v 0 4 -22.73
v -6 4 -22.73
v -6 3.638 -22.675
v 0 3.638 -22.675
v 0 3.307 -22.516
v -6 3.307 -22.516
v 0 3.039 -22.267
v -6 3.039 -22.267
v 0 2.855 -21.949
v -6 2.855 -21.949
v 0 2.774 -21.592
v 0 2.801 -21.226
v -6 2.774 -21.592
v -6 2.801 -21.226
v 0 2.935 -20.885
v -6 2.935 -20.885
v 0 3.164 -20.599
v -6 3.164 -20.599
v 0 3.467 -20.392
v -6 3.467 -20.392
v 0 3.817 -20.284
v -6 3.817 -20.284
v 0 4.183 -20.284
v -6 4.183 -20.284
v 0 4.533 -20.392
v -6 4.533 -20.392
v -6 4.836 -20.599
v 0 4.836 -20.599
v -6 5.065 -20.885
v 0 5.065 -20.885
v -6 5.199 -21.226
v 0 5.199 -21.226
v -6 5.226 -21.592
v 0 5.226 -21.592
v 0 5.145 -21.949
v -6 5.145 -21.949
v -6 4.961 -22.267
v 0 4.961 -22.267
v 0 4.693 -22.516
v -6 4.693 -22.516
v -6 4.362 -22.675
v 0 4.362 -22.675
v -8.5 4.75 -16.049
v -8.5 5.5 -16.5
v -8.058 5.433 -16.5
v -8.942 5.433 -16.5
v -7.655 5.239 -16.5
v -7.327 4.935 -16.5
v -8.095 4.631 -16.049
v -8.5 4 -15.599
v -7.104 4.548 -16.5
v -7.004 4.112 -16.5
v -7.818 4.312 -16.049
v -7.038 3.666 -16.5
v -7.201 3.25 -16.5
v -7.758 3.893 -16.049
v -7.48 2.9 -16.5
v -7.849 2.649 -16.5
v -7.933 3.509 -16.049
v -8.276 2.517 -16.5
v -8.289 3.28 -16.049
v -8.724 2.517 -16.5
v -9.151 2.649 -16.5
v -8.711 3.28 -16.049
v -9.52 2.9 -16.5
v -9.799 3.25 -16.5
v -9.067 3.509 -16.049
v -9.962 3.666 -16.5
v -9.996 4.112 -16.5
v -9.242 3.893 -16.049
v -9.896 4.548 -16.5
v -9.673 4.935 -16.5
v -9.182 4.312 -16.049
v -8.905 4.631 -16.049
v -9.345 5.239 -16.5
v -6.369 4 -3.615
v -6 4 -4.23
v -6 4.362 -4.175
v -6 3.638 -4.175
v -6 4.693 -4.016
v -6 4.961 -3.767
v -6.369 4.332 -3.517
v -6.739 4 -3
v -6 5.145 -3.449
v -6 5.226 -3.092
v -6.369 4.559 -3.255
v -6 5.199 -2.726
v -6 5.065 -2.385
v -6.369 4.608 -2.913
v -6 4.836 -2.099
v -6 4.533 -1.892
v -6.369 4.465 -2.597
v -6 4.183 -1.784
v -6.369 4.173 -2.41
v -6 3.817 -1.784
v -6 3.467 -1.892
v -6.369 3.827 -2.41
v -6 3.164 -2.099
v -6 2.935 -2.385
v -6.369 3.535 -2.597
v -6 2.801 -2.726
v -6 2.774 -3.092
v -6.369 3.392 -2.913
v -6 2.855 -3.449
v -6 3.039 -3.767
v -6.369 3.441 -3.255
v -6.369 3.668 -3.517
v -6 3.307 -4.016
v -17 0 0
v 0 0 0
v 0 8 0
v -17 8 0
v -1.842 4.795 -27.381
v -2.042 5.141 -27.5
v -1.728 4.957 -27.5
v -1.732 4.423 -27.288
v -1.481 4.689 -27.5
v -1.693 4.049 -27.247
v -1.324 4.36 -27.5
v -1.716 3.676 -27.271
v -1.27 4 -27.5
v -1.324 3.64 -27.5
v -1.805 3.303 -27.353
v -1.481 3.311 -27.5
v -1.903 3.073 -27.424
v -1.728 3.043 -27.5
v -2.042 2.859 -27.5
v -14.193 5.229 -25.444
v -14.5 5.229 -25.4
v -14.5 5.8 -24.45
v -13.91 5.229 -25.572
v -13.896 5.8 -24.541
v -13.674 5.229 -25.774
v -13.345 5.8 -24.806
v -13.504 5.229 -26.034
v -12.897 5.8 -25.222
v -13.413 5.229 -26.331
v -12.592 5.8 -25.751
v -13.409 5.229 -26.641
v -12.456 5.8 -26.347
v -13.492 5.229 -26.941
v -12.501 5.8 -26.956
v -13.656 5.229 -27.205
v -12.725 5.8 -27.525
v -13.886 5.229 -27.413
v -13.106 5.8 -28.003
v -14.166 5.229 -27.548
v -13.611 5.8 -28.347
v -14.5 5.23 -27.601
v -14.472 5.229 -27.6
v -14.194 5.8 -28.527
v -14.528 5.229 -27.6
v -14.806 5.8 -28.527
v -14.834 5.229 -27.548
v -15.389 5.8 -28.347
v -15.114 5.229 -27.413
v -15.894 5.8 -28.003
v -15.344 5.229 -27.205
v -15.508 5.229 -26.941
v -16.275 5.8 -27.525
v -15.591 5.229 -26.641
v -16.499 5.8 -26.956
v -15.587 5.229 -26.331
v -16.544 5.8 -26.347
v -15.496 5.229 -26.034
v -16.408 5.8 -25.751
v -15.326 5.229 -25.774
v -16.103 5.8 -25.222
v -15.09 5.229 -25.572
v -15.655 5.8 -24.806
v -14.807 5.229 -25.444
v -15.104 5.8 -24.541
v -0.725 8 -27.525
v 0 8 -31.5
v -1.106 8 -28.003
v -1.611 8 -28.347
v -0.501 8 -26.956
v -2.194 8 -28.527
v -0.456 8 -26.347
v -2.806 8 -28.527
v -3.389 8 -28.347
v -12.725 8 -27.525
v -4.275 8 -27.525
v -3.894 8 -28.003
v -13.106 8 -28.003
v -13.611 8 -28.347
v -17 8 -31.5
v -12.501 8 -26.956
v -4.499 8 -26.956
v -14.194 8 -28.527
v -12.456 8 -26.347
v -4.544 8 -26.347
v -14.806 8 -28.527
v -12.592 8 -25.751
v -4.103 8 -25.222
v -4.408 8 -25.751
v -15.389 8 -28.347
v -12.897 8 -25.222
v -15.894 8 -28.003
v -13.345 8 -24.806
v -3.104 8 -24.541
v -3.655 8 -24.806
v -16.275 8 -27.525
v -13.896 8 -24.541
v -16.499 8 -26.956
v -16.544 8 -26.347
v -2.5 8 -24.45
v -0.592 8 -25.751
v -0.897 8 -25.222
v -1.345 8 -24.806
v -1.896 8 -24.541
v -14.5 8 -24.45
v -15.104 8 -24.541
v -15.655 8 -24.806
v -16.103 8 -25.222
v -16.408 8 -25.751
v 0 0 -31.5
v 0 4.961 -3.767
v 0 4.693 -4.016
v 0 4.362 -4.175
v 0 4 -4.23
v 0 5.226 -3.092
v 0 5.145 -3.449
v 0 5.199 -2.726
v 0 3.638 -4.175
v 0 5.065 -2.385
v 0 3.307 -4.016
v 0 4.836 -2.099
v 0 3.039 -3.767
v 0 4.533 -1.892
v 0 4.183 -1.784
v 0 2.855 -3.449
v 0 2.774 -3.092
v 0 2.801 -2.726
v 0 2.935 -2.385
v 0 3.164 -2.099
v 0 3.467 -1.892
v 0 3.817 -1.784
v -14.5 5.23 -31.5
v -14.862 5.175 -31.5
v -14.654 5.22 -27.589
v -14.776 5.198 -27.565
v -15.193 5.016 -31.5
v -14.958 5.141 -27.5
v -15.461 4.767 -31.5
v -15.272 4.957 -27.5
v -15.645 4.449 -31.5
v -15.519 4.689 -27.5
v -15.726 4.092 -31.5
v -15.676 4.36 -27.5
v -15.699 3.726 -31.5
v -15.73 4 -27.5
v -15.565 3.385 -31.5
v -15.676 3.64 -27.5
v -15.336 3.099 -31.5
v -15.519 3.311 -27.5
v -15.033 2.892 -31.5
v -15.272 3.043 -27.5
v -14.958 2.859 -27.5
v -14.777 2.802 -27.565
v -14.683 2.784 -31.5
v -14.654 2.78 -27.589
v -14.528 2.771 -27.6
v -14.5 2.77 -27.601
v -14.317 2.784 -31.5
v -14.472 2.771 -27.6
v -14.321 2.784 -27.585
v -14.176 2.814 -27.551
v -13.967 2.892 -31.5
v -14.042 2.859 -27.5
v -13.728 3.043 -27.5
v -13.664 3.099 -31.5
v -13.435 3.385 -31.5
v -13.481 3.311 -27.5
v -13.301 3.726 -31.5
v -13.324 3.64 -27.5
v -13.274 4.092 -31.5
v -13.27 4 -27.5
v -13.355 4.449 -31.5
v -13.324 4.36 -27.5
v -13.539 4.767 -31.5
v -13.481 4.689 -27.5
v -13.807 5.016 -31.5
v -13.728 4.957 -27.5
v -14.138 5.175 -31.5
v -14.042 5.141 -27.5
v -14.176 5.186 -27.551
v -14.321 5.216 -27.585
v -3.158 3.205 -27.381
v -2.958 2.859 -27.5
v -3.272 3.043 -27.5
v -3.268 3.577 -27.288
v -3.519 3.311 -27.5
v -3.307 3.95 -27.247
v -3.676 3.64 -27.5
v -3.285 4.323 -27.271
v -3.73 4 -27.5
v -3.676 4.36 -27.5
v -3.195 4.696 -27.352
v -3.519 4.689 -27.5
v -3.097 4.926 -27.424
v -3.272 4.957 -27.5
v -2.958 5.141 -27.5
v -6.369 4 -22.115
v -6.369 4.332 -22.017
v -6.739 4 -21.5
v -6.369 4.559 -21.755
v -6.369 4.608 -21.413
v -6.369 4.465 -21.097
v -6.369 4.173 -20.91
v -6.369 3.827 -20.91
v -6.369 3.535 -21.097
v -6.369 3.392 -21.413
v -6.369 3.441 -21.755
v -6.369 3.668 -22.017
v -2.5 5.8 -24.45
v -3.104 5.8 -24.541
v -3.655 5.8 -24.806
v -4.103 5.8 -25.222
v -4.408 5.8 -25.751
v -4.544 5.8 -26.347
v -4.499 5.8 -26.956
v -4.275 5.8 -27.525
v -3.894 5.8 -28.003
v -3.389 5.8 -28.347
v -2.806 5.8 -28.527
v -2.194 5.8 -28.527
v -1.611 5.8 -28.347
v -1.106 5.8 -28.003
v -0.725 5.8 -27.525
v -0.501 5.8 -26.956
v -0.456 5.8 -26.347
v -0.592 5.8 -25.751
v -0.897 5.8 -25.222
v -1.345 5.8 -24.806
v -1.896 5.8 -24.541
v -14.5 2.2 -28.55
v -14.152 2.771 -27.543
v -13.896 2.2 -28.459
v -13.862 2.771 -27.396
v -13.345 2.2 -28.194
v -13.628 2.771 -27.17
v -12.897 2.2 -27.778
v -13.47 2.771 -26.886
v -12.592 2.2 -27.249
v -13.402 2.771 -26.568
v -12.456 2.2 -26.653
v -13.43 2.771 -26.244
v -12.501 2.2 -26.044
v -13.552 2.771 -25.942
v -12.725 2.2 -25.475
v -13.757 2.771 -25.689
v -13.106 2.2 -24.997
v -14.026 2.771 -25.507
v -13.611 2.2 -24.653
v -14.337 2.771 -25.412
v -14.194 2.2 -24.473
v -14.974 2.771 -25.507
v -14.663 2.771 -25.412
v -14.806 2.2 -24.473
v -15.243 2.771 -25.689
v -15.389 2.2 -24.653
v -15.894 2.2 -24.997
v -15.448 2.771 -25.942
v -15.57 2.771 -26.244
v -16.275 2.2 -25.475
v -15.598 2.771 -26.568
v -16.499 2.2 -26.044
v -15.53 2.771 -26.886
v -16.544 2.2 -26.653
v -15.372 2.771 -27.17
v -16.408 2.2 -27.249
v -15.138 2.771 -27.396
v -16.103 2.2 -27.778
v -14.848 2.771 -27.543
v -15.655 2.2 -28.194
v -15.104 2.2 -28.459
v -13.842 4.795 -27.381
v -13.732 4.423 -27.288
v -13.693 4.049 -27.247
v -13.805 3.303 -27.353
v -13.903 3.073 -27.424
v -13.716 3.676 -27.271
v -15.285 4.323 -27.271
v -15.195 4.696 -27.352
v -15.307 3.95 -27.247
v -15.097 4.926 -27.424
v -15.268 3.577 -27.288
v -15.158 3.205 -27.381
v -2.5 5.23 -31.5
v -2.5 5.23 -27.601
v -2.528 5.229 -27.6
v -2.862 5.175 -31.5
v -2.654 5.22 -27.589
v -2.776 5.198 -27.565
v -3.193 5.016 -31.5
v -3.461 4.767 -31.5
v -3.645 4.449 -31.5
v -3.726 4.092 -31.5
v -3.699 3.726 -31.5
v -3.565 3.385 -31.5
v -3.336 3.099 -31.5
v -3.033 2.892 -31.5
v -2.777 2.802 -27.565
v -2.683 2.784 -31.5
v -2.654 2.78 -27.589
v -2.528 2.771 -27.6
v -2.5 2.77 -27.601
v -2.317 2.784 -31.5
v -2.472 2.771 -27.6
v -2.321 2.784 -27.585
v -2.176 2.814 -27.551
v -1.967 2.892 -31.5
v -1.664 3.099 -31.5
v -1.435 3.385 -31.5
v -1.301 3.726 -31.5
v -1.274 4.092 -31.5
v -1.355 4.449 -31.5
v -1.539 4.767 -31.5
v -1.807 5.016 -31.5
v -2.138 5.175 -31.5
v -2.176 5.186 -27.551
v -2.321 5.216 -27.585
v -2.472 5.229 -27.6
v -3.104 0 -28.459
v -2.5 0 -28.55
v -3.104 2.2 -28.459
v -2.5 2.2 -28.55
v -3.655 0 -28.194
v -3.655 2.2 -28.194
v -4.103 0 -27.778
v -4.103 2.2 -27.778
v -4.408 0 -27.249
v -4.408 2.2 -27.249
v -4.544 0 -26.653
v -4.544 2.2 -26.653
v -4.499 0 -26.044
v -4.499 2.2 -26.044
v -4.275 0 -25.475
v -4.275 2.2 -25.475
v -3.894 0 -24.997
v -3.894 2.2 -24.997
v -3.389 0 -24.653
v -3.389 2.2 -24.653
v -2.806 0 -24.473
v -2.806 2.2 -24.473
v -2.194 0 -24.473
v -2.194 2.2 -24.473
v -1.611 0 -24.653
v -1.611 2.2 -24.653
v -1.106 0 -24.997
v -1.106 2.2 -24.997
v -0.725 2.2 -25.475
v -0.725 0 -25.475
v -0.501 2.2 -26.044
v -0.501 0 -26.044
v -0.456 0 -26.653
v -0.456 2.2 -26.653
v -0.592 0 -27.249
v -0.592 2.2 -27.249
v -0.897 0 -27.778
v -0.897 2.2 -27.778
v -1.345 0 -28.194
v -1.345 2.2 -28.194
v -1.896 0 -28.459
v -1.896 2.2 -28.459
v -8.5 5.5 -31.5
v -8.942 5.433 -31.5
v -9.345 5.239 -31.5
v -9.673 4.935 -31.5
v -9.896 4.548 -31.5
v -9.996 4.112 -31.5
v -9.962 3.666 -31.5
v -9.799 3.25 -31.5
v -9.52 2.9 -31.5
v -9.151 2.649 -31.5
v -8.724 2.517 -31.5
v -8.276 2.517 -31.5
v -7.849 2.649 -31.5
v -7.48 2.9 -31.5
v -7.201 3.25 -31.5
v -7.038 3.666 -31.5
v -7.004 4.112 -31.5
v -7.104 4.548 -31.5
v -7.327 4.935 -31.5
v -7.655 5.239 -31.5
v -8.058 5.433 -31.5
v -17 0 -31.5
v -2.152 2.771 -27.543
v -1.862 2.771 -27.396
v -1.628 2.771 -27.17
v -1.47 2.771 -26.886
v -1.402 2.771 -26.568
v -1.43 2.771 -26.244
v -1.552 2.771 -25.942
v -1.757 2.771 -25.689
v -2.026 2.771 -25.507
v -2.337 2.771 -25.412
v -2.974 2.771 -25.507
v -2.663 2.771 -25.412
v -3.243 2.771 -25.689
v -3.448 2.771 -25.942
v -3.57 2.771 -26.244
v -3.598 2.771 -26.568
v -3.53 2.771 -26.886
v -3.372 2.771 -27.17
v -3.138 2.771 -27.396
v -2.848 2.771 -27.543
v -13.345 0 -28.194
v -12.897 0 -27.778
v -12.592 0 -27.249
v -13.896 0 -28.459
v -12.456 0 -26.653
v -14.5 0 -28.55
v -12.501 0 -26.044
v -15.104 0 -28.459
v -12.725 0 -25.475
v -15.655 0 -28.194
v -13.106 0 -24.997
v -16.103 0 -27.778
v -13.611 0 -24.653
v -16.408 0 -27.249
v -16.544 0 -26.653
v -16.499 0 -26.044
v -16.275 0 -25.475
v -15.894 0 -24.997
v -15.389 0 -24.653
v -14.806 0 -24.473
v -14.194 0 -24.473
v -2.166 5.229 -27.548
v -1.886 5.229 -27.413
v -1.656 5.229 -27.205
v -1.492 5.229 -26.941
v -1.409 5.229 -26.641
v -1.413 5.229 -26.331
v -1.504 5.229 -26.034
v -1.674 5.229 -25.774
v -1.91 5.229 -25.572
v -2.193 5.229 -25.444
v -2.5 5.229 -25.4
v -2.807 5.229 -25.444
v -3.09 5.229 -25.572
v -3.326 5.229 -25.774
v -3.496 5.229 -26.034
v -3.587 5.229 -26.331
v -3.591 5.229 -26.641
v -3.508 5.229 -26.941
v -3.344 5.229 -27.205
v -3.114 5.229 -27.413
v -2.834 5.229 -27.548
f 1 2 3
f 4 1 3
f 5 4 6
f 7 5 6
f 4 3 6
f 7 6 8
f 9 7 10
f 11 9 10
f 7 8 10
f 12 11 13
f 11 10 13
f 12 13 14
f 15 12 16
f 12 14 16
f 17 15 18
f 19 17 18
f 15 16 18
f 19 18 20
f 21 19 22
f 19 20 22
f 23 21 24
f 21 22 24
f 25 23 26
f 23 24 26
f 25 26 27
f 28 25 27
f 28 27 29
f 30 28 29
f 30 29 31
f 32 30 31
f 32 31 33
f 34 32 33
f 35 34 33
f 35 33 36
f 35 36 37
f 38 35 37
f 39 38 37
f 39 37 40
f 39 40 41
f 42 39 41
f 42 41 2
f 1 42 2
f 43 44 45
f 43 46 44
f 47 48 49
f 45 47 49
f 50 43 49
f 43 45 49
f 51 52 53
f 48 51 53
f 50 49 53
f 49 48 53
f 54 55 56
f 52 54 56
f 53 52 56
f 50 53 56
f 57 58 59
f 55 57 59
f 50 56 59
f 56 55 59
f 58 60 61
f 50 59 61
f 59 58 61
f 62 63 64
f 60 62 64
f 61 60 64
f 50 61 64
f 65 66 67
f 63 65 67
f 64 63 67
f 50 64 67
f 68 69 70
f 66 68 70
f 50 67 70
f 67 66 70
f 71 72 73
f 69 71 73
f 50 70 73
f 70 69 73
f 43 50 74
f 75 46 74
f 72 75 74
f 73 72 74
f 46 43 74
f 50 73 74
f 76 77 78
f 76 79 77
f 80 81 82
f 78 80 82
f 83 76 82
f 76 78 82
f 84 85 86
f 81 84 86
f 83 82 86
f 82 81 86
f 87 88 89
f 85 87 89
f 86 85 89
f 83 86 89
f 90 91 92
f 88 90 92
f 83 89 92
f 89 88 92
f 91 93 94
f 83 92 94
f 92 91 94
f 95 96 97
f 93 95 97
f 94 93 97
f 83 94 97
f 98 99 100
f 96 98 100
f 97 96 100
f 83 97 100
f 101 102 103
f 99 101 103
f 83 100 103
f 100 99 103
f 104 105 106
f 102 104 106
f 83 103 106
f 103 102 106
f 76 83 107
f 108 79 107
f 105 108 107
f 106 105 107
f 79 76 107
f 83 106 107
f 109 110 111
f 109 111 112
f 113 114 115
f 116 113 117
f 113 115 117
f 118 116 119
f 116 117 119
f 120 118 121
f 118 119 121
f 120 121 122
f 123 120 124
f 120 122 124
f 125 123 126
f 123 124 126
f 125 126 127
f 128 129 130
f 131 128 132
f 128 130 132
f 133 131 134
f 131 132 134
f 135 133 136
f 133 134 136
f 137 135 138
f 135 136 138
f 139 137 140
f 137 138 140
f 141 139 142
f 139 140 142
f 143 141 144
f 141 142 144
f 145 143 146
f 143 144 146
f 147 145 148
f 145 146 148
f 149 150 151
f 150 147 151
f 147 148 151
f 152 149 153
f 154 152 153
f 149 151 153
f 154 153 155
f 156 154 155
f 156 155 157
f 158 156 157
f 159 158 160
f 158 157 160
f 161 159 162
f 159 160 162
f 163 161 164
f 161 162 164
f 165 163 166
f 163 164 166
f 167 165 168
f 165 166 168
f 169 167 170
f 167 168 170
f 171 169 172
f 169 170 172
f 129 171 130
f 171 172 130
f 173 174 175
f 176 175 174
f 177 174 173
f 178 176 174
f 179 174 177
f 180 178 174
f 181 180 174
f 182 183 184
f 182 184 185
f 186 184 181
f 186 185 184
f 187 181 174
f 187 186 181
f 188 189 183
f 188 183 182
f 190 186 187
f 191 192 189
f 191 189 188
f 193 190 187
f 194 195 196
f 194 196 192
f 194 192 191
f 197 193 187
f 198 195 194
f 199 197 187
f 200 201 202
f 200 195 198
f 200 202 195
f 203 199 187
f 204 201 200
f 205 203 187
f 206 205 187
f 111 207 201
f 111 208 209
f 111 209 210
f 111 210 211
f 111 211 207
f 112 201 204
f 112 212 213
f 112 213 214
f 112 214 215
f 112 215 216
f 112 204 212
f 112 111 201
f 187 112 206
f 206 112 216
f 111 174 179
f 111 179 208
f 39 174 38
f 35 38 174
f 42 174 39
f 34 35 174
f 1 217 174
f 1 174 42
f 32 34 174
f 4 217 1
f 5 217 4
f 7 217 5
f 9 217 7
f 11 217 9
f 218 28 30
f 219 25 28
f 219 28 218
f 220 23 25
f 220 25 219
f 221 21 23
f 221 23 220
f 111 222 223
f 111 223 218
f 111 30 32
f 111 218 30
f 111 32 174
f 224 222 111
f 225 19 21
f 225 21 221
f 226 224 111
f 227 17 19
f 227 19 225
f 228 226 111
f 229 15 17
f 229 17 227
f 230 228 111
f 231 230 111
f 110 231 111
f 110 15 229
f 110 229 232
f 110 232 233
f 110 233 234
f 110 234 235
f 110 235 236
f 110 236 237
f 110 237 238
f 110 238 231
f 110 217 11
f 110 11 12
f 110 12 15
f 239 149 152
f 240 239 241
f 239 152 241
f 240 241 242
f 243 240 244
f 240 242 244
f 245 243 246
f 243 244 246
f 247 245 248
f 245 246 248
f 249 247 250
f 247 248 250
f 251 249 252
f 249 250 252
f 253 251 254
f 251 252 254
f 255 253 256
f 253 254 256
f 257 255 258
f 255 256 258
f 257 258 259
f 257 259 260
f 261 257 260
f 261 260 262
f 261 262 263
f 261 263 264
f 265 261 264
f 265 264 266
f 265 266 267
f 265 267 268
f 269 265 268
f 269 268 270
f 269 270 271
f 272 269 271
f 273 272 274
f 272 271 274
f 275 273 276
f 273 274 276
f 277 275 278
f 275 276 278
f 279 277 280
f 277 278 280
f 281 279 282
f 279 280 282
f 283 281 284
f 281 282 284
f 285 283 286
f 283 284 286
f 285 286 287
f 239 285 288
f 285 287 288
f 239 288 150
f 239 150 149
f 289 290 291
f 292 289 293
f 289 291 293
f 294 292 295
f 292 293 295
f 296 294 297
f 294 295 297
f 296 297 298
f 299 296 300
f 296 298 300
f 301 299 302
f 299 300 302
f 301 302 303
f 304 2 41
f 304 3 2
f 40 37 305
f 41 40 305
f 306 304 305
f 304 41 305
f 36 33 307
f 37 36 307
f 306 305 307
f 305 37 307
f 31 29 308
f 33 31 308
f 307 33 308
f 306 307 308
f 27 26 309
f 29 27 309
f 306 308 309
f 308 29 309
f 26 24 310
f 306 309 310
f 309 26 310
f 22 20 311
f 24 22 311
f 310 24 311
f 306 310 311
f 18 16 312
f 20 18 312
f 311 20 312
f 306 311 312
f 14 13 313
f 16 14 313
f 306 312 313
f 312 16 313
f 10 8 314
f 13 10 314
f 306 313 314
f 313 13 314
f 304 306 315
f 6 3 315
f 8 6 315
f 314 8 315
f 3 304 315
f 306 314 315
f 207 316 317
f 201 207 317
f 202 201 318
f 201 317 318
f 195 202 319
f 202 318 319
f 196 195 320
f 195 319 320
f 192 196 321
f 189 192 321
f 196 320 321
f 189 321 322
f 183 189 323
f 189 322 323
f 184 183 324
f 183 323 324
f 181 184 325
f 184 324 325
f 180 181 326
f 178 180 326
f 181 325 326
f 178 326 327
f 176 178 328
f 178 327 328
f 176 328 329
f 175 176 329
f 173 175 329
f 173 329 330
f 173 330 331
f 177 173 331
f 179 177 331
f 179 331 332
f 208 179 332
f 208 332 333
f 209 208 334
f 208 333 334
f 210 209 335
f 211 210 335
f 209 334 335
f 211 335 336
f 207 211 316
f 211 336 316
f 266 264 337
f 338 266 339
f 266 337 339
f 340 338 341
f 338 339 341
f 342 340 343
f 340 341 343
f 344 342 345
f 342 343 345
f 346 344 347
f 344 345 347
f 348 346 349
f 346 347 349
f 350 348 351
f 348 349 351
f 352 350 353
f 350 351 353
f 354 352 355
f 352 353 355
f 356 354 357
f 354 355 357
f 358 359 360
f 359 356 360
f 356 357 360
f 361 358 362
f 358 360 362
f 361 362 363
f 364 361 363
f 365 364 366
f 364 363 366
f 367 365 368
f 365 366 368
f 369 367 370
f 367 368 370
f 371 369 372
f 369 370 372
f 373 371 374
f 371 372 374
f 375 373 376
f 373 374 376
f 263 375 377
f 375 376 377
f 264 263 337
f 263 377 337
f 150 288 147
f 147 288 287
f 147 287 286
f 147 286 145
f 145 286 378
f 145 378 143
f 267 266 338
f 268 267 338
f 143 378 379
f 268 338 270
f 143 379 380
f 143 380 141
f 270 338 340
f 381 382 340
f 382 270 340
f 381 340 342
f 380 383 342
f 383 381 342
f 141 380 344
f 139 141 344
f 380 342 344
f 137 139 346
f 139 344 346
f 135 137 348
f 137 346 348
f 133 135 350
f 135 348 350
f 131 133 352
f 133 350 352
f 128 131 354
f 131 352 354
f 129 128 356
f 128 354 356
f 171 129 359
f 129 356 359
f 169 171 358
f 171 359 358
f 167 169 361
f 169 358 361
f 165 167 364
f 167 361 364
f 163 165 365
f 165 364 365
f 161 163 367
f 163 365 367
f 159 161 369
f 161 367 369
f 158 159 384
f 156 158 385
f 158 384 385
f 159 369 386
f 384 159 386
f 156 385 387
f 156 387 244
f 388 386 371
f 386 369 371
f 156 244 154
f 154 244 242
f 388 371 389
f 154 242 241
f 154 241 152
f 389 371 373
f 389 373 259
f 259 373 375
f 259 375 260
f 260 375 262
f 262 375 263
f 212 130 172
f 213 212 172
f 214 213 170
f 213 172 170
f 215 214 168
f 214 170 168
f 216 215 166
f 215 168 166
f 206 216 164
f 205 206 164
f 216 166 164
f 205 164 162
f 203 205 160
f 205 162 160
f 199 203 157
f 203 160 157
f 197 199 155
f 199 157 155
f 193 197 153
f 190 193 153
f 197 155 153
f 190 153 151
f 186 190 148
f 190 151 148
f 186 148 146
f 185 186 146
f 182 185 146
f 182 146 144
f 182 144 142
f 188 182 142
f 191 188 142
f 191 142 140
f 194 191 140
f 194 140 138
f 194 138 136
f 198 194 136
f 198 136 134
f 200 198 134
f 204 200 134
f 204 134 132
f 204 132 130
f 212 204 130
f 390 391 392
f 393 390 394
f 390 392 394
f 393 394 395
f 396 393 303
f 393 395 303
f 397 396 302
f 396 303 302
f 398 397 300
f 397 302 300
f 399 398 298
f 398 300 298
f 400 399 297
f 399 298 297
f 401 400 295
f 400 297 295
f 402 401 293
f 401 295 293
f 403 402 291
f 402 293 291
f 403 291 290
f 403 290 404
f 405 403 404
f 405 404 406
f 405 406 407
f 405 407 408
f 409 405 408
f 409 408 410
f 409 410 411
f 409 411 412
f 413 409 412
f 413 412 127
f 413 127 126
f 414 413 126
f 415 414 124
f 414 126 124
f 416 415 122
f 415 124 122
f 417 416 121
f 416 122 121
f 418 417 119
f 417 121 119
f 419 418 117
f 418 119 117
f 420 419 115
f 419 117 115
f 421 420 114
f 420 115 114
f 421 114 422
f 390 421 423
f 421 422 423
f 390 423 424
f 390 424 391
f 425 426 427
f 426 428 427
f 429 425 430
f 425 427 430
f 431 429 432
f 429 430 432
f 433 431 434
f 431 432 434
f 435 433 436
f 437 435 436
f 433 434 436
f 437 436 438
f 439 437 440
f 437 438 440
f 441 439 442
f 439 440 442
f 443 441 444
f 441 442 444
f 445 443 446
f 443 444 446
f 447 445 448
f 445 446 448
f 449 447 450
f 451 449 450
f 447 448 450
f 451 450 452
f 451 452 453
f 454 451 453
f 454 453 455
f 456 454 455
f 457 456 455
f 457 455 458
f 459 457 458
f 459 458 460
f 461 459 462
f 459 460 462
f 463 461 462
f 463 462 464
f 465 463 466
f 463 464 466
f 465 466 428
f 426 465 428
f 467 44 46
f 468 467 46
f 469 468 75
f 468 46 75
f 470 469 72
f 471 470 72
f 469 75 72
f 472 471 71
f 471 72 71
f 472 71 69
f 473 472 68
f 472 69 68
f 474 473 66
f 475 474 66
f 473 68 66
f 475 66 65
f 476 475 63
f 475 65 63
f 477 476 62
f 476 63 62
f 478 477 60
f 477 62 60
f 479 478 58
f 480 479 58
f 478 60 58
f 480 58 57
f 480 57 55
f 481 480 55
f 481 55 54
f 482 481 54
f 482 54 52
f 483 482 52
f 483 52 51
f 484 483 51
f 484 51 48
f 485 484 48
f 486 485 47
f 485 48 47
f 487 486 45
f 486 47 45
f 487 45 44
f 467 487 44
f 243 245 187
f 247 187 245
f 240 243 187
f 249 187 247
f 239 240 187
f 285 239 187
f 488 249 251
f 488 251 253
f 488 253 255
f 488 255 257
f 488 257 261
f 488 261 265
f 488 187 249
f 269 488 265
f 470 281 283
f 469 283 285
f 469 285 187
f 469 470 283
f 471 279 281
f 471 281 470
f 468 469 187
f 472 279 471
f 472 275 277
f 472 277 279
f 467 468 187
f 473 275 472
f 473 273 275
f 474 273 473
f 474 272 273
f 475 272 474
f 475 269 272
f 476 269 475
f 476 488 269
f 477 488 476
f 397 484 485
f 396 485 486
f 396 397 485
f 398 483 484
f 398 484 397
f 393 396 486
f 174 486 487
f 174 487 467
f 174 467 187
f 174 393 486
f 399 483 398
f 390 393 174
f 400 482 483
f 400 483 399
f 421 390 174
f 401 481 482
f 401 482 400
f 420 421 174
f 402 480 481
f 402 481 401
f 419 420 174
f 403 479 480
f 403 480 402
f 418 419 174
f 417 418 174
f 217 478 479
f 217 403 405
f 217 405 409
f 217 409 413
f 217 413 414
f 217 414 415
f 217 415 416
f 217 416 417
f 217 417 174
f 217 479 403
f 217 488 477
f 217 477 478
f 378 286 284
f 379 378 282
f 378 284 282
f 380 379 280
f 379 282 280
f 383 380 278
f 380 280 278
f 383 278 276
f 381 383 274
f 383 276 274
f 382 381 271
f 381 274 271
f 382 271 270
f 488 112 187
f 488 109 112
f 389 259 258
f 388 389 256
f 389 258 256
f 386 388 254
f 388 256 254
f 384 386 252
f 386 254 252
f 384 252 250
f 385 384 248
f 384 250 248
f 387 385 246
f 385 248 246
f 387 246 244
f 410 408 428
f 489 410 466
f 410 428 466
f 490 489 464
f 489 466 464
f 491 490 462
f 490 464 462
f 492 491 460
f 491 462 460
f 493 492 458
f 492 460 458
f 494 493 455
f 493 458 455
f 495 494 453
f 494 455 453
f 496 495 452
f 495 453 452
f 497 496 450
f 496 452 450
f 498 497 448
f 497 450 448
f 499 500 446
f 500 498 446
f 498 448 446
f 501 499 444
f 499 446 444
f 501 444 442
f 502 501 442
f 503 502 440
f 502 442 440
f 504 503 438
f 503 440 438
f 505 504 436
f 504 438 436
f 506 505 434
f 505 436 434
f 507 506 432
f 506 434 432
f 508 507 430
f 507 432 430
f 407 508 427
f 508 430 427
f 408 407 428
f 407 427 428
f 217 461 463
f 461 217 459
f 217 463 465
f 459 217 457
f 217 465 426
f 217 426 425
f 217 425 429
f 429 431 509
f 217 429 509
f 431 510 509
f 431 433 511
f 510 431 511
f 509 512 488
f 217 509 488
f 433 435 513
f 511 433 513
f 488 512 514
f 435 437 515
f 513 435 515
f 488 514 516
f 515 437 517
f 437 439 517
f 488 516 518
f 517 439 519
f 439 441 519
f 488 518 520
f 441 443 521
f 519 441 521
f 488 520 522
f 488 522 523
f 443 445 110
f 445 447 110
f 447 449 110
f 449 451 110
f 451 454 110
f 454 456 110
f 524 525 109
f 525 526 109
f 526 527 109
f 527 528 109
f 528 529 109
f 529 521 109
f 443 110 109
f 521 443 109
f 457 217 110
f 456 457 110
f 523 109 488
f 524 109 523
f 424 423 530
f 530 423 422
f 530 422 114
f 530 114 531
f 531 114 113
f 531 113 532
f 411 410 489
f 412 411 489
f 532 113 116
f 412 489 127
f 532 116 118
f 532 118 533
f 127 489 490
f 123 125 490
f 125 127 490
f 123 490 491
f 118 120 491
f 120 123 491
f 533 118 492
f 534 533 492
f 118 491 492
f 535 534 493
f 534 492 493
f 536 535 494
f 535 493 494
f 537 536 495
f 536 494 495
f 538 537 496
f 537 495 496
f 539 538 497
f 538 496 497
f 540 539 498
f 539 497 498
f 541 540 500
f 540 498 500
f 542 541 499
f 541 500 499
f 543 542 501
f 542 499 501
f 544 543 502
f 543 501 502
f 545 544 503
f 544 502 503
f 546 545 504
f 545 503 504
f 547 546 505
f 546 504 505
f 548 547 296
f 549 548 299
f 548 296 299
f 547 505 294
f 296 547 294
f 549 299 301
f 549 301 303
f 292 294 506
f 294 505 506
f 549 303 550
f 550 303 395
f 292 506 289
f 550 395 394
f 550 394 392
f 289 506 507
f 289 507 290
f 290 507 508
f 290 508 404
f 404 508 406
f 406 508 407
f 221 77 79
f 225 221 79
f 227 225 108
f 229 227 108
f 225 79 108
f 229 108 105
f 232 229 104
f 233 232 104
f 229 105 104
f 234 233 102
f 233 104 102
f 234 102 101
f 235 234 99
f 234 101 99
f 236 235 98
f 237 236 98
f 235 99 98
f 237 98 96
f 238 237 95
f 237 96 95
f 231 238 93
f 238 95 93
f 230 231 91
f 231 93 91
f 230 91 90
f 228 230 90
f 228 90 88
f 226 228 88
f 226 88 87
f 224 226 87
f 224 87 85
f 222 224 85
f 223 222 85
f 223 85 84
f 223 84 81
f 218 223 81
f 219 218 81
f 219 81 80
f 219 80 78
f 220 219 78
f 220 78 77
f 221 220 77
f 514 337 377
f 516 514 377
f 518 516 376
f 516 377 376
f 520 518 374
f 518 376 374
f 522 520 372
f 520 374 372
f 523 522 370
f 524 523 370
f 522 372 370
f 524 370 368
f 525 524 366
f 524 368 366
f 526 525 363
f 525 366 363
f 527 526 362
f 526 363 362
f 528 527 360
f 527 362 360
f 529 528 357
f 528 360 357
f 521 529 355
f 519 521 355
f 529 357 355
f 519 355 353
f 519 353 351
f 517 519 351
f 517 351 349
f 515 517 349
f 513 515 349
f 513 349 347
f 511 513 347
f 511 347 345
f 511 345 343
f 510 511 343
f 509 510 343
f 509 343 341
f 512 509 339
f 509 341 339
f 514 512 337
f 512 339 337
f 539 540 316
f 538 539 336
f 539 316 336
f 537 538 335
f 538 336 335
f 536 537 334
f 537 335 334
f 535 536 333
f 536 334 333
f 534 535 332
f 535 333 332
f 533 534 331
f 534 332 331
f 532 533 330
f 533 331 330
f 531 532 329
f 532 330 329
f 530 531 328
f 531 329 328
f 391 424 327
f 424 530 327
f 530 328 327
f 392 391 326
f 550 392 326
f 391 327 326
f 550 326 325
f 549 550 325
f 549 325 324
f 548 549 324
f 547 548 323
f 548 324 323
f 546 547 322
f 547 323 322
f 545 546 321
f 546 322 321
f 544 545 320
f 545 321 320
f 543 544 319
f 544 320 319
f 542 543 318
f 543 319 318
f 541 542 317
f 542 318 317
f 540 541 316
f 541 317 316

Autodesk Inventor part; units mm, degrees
ref_plane "YZ Plane" through (0, 0, 0) normal (1, 0, 0) x (0, 1, 0)
ref_plane "XZ Plane" through (0, 0, 0) normal (0, 1, 0) x (-1, 0, 0)
ref_plane "XY Plane" through (0, 0, 0) normal (0, 0, 1) x (1, 0, 0)
sketch "スケッチ1" plane through (0, 0, 0) normal (0, 1, 0) x (-1, 0, 0)
  line L0 (0, 0) -> (17, 0)
  line L1 (17, 0) -> (17, -31.5)
  line L2 (17, -31.5) -> (0, -31.5)
  line L3 (0, -31.5) -> (0, 0)
  dimension "d0" = 17
  dimension "d1" = 31.5
extrude "押し出し1" add sketch "スケッチ1" along normal blind 8
sketch "スケッチ2" plane through (0, 0, 0) normal (1, 0, 0) x (0, 0, -1)
  line L0 (31.5, 0) -> (31.5, 8) projected
  line L1 (0, 0) -> (31.5, 0) projected
  point P0 (21.5, 4)
  point P1 (3, 4)
  dimension "d4" = 10
  dimension "d5" = 18.5
  dimension "d6" = 4
  dimension "d7" = 4
hole "穴1" at (0, 4, -21.5) at (0, 4, -3) direction (-1, 0, 0) diameter 2.459 depth 6 tip angle 118 thread size "M3x0.5" class "6H" standard "ISO Metric profile"
sketch "スケッチ3" plane through (0, 0, -31.5) normal (0, 0, -1) x (-1, 0, 0)
  line L0 (0, 0) -> (17, 0) projected
  line L1 (0, 0) -> (0, 8) projected
  point P0 (2.5, 4)
  point P1 (14.5, 4)
  dimension "d15" = 4
  dimension "d16" = 4
  dimension "d17" = 2.5
  dimension "d18" = 12
hole "穴2" at (-2.5, 4, -31.5) at (-14.5, 4, -31.5) direction (0, 0, 1) diameter 2.459 depth 4 tip angle 118 thread size "M3x0.5" class "6H" standard "ISO Metric profile"
sketch "スケッチ4" plane through (0, 8, 0) normal (0, 1, 0) x (1, 0, 0)
  line L0 (0, 31.5) -> (-17, 31.5) projected
  line L1 (0, 0) -> (0, 31.5) projected
  point P0 (-2.5, 26.5)
  point P1 (-14.5, 26.5)
  dimension "d26" = 5
  dimension "d27" = 5
  dimension "d28" = 2.5
  dimension "d29" = 12
hole "穴3" at (-2.5, 8, -26.5) at (-14.5, 8, -26.5) direction (0, -1, 0) diameter 4.1 depth 2.2 tip angle 118
sketch "スケッチ5" plane through (0, 8, 0) normal (0, 1, 0) x (1, 0, 0)
  circle A0 centre (-2.5, 26.5) radius 2.05 projected
  circle A1 centre (-14.5, 26.5) radius 2.05 projected
  point P0 (0, 0)
hole "穴4" at (-2.5, 8, -26.5) at (-14.5, 8, -26.5) at (-2.5, 8, -26.5) at (-14.5, 8, -26.5) direction (0, -1, 0) diameter 2.2 end through all
sketch "スケッチ6" plane through (0, 0, 0) normal (0, -1, 0) x (1, 0, 0)
  circle A0 centre (-14.5, -26.5) radius 2.05 projected
  arc A1 (-2.4721, -27.5996) -> (-2.5279, -27.5996) centre (-2.5, -26.5) ccw projected
  point P0 (0, 0)
hole "穴5" at (-14.5, 0, -26.5) at (-2.5, 0, -26.5) direction (0, 1, 0) diameter 4.1 depth 2.2 tip angle 118
sketch "スケッチ7" plane through (0, 0, -31.5) normal (0, 0, -1) x (-1, 0, 0)
  line L0 (0, 0) -> (17, 0) projected
  line L1 (17, 0) -> (17, 8) projected
  point P0 (8.5, 4)
  dimension "d51" = 4
  dimension "d52" = 8.5
hole "穴6" at (-8.5, 4, -31.5) direction (0, 0, 1) diameter 3 depth 15 tip angle 118
properties part number "本体"
